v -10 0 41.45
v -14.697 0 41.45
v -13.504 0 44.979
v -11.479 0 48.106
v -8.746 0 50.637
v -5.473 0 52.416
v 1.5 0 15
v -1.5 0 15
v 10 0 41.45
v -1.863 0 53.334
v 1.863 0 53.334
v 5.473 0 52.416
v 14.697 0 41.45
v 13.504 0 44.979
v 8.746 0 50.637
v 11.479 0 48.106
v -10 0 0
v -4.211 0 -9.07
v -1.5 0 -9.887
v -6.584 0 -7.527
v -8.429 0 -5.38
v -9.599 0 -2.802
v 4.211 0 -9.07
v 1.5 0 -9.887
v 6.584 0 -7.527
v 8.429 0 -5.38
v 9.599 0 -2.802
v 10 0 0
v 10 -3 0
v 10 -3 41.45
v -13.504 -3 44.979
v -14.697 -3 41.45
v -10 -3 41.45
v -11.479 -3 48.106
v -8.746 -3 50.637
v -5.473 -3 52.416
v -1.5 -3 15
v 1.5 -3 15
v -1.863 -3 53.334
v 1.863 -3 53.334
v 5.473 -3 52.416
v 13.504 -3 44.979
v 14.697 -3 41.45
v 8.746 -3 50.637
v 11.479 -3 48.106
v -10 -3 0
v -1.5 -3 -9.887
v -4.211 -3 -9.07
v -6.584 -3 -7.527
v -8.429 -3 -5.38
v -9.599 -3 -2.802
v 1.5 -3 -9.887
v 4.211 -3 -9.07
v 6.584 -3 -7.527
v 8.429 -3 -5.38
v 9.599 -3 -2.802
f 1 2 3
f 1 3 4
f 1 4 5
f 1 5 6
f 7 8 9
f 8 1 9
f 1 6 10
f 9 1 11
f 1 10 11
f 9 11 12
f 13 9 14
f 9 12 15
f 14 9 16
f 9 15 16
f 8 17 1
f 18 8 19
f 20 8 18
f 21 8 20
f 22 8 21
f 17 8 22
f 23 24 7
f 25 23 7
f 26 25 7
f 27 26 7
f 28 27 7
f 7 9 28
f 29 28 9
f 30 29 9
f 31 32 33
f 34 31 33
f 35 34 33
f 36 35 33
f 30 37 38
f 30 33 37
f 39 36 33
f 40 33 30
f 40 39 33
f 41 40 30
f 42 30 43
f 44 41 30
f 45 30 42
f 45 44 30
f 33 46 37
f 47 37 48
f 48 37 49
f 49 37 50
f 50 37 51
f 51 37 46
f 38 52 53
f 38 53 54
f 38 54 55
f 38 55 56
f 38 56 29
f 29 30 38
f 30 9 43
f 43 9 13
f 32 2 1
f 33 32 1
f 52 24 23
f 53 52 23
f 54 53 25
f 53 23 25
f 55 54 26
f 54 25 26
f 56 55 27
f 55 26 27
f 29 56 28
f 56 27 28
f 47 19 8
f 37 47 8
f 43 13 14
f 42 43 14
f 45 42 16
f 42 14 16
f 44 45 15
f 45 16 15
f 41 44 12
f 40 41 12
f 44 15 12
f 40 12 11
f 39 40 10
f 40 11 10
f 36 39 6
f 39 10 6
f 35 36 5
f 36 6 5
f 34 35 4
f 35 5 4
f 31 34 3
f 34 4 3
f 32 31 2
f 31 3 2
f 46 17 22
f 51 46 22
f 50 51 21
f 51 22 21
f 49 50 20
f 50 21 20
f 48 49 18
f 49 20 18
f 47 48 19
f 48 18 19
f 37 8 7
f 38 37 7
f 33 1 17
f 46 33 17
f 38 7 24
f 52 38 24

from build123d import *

# Parameters (mm, degrees)
F1_DEPTH = 3


with BuildPart() as f1:
    # F0 (on Front) → F1 (new body)
    with BuildSketch(Plane.XZ):
        with BuildLine():
            Line((-14.696938, 41.45), (-10, 41.45))
            Line((-10, 41.45), (-10, 0))
            ThreePointArc((-10, 0), (-7.582875, -6.519202), (-1.5, -9.88686))
            Line((-1.5, -9.88686), (-1.5, 15))
            Line((-1.5, 15), (1.5, 15))
            Line((1.5, 15), (1.5, -9.88686))
            ThreePointArc((1.5, -9.88686), (7.582875, -6.519202), (10, 0))
            Line((10, 0), (10, 41.45))
            Line((10, 41.45), (14.696938, 41.45))
            ThreePointArc((14.696938, 41.45), (0, 53.45), (-14.696938, 41.45))
        make_face()
    extrude(amount=F1_DEPTH)


solid = f1.part
